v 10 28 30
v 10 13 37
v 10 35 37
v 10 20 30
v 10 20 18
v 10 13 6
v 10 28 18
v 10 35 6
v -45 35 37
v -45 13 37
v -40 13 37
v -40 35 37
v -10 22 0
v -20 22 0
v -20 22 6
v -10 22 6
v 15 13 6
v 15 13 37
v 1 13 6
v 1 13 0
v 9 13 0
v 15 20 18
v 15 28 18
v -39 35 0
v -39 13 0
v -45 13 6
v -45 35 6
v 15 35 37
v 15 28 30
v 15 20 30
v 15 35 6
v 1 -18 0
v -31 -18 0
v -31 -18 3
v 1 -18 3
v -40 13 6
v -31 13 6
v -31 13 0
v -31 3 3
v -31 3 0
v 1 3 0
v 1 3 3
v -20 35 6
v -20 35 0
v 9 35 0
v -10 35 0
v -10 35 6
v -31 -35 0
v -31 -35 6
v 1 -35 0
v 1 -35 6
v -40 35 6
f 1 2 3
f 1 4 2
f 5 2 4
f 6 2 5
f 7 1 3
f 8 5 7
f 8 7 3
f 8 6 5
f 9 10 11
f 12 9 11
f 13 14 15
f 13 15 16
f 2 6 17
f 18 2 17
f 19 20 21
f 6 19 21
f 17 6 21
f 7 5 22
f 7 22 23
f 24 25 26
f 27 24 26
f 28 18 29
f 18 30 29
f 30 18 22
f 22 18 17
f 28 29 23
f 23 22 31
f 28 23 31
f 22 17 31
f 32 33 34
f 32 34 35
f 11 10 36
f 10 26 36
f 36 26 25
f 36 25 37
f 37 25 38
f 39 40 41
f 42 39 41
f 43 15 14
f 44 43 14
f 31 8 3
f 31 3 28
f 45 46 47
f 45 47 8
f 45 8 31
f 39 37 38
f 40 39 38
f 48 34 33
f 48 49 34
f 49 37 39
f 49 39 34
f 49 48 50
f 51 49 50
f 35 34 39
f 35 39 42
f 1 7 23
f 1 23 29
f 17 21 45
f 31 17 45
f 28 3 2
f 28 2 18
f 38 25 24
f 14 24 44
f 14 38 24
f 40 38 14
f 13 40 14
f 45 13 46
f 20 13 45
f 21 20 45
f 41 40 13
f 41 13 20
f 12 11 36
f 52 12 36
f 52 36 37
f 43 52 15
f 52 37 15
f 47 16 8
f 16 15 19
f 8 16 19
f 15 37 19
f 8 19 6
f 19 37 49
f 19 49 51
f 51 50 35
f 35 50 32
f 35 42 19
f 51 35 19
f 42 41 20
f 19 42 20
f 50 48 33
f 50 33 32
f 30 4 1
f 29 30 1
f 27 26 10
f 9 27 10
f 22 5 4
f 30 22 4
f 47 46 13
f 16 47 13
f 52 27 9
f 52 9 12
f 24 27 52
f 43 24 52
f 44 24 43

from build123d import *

# Parameters (mm, degrees)
EXTRUDE_1_DEPTH            = 6
SKETCH_2_W                 = 5
SKETCH_2_H                 = 22
EXTRUDE_2_DEPTH            = 31
CHAMFER_1_SIZE             = 6
SKETCH_3_W                 = 12
SKETCH_3_H                 = 8
CUT_EXTRUDE_1_DEPTH        = 57.73623181
SKETCH_4_W                 = 3
SKETCH_4_H                 = 21
CUT_EXTRUDE_2_DEPTH        = 60.110066825
CHAMFER_1_OF_MIRROR_1_SIZE = 6


with BuildPart() as part:
    # Эскиз1 → Бобышка-Вытянуть1 (new body)
    with BuildSketch(Plane.XY):
        Polygon((-15, 22), (-15, -35), (1, -35), (1, 13), (15, 13), (15, 35), (-10, 35), (-10, 22), align=None)
    extrude_1 = extrude(amount=EXTRUDE_1_DEPTH)

    # Эскиз2 → Бобышка-Вытянуть2 (add)
    with BuildSketch(Plane.XY.offset(6)):
        with Locations((12.5, 24)):
            Rectangle(SKETCH_2_W, SKETCH_2_H)
    extrude_2 = extrude(amount=EXTRUDE_2_DEPTH)

    # Фаска1
    chamfer_1_edges = [part.edges().sort_by_distance(p)[0] for p in [
        (15, 24, 0),
    ]]
    chamfer(chamfer_1_edges, length=CHAMFER_1_SIZE)

    # Эскиз3 → Вырез-Вытянуть1 (cut, through all)
    with BuildSketch(Plane.ZY.offset(-10)):
        with Locations((24, 24)):
            Rectangle(SKETCH_3_W, SKETCH_3_H)
    extrude(amount=-CUT_EXTRUDE_1_DEPTH, mode=Mode.SUBTRACT)

    # Эскиз4 → Вырез-Вытянуть2 (cut, through all)
    with BuildSketch(Plane.ZY.offset(15)):
        with Locations((1.5, -7.5)):
            Rectangle(SKETCH_4_W, SKETCH_4_H)
    cut_extrude_2 = extrude(amount=-CUT_EXTRUDE_2_DEPTH, mode=Mode.SUBTRACT)

    # Зеркальное отражение1: Бобышка-Вытянуть1, Бобышка-Вытянуть2, Вырез-Вытянуть2 across plane
    add(extrude_1.mirror(Plane(origin=(-15, 0, 6), x_dir=(0, 0, 1), z_dir=(-1, 0, 0))))
    add(extrude_2.mirror(Plane(origin=(-15, 0, 6), x_dir=(0, 0, 1), z_dir=(-1, 0, 0))))
    add(cut_extrude_2.mirror(Plane(origin=(-15, 0, 6), x_dir=(0, 0, 1), z_dir=(-1, 0, 0))), mode=Mode.SUBTRACT)

    # Фаска1 of Зеркальное отражение1
    chamfer_1_of_mirror_1_edges = [part.edges().sort_by_distance(p)[0] for p in [
        (-45, 24, 0),
    ]]
    chamfer(chamfer_1_of_mirror_1_edges, length=CHAMFER_1_OF_MIRROR_1_SIZE)


solid = part.part
